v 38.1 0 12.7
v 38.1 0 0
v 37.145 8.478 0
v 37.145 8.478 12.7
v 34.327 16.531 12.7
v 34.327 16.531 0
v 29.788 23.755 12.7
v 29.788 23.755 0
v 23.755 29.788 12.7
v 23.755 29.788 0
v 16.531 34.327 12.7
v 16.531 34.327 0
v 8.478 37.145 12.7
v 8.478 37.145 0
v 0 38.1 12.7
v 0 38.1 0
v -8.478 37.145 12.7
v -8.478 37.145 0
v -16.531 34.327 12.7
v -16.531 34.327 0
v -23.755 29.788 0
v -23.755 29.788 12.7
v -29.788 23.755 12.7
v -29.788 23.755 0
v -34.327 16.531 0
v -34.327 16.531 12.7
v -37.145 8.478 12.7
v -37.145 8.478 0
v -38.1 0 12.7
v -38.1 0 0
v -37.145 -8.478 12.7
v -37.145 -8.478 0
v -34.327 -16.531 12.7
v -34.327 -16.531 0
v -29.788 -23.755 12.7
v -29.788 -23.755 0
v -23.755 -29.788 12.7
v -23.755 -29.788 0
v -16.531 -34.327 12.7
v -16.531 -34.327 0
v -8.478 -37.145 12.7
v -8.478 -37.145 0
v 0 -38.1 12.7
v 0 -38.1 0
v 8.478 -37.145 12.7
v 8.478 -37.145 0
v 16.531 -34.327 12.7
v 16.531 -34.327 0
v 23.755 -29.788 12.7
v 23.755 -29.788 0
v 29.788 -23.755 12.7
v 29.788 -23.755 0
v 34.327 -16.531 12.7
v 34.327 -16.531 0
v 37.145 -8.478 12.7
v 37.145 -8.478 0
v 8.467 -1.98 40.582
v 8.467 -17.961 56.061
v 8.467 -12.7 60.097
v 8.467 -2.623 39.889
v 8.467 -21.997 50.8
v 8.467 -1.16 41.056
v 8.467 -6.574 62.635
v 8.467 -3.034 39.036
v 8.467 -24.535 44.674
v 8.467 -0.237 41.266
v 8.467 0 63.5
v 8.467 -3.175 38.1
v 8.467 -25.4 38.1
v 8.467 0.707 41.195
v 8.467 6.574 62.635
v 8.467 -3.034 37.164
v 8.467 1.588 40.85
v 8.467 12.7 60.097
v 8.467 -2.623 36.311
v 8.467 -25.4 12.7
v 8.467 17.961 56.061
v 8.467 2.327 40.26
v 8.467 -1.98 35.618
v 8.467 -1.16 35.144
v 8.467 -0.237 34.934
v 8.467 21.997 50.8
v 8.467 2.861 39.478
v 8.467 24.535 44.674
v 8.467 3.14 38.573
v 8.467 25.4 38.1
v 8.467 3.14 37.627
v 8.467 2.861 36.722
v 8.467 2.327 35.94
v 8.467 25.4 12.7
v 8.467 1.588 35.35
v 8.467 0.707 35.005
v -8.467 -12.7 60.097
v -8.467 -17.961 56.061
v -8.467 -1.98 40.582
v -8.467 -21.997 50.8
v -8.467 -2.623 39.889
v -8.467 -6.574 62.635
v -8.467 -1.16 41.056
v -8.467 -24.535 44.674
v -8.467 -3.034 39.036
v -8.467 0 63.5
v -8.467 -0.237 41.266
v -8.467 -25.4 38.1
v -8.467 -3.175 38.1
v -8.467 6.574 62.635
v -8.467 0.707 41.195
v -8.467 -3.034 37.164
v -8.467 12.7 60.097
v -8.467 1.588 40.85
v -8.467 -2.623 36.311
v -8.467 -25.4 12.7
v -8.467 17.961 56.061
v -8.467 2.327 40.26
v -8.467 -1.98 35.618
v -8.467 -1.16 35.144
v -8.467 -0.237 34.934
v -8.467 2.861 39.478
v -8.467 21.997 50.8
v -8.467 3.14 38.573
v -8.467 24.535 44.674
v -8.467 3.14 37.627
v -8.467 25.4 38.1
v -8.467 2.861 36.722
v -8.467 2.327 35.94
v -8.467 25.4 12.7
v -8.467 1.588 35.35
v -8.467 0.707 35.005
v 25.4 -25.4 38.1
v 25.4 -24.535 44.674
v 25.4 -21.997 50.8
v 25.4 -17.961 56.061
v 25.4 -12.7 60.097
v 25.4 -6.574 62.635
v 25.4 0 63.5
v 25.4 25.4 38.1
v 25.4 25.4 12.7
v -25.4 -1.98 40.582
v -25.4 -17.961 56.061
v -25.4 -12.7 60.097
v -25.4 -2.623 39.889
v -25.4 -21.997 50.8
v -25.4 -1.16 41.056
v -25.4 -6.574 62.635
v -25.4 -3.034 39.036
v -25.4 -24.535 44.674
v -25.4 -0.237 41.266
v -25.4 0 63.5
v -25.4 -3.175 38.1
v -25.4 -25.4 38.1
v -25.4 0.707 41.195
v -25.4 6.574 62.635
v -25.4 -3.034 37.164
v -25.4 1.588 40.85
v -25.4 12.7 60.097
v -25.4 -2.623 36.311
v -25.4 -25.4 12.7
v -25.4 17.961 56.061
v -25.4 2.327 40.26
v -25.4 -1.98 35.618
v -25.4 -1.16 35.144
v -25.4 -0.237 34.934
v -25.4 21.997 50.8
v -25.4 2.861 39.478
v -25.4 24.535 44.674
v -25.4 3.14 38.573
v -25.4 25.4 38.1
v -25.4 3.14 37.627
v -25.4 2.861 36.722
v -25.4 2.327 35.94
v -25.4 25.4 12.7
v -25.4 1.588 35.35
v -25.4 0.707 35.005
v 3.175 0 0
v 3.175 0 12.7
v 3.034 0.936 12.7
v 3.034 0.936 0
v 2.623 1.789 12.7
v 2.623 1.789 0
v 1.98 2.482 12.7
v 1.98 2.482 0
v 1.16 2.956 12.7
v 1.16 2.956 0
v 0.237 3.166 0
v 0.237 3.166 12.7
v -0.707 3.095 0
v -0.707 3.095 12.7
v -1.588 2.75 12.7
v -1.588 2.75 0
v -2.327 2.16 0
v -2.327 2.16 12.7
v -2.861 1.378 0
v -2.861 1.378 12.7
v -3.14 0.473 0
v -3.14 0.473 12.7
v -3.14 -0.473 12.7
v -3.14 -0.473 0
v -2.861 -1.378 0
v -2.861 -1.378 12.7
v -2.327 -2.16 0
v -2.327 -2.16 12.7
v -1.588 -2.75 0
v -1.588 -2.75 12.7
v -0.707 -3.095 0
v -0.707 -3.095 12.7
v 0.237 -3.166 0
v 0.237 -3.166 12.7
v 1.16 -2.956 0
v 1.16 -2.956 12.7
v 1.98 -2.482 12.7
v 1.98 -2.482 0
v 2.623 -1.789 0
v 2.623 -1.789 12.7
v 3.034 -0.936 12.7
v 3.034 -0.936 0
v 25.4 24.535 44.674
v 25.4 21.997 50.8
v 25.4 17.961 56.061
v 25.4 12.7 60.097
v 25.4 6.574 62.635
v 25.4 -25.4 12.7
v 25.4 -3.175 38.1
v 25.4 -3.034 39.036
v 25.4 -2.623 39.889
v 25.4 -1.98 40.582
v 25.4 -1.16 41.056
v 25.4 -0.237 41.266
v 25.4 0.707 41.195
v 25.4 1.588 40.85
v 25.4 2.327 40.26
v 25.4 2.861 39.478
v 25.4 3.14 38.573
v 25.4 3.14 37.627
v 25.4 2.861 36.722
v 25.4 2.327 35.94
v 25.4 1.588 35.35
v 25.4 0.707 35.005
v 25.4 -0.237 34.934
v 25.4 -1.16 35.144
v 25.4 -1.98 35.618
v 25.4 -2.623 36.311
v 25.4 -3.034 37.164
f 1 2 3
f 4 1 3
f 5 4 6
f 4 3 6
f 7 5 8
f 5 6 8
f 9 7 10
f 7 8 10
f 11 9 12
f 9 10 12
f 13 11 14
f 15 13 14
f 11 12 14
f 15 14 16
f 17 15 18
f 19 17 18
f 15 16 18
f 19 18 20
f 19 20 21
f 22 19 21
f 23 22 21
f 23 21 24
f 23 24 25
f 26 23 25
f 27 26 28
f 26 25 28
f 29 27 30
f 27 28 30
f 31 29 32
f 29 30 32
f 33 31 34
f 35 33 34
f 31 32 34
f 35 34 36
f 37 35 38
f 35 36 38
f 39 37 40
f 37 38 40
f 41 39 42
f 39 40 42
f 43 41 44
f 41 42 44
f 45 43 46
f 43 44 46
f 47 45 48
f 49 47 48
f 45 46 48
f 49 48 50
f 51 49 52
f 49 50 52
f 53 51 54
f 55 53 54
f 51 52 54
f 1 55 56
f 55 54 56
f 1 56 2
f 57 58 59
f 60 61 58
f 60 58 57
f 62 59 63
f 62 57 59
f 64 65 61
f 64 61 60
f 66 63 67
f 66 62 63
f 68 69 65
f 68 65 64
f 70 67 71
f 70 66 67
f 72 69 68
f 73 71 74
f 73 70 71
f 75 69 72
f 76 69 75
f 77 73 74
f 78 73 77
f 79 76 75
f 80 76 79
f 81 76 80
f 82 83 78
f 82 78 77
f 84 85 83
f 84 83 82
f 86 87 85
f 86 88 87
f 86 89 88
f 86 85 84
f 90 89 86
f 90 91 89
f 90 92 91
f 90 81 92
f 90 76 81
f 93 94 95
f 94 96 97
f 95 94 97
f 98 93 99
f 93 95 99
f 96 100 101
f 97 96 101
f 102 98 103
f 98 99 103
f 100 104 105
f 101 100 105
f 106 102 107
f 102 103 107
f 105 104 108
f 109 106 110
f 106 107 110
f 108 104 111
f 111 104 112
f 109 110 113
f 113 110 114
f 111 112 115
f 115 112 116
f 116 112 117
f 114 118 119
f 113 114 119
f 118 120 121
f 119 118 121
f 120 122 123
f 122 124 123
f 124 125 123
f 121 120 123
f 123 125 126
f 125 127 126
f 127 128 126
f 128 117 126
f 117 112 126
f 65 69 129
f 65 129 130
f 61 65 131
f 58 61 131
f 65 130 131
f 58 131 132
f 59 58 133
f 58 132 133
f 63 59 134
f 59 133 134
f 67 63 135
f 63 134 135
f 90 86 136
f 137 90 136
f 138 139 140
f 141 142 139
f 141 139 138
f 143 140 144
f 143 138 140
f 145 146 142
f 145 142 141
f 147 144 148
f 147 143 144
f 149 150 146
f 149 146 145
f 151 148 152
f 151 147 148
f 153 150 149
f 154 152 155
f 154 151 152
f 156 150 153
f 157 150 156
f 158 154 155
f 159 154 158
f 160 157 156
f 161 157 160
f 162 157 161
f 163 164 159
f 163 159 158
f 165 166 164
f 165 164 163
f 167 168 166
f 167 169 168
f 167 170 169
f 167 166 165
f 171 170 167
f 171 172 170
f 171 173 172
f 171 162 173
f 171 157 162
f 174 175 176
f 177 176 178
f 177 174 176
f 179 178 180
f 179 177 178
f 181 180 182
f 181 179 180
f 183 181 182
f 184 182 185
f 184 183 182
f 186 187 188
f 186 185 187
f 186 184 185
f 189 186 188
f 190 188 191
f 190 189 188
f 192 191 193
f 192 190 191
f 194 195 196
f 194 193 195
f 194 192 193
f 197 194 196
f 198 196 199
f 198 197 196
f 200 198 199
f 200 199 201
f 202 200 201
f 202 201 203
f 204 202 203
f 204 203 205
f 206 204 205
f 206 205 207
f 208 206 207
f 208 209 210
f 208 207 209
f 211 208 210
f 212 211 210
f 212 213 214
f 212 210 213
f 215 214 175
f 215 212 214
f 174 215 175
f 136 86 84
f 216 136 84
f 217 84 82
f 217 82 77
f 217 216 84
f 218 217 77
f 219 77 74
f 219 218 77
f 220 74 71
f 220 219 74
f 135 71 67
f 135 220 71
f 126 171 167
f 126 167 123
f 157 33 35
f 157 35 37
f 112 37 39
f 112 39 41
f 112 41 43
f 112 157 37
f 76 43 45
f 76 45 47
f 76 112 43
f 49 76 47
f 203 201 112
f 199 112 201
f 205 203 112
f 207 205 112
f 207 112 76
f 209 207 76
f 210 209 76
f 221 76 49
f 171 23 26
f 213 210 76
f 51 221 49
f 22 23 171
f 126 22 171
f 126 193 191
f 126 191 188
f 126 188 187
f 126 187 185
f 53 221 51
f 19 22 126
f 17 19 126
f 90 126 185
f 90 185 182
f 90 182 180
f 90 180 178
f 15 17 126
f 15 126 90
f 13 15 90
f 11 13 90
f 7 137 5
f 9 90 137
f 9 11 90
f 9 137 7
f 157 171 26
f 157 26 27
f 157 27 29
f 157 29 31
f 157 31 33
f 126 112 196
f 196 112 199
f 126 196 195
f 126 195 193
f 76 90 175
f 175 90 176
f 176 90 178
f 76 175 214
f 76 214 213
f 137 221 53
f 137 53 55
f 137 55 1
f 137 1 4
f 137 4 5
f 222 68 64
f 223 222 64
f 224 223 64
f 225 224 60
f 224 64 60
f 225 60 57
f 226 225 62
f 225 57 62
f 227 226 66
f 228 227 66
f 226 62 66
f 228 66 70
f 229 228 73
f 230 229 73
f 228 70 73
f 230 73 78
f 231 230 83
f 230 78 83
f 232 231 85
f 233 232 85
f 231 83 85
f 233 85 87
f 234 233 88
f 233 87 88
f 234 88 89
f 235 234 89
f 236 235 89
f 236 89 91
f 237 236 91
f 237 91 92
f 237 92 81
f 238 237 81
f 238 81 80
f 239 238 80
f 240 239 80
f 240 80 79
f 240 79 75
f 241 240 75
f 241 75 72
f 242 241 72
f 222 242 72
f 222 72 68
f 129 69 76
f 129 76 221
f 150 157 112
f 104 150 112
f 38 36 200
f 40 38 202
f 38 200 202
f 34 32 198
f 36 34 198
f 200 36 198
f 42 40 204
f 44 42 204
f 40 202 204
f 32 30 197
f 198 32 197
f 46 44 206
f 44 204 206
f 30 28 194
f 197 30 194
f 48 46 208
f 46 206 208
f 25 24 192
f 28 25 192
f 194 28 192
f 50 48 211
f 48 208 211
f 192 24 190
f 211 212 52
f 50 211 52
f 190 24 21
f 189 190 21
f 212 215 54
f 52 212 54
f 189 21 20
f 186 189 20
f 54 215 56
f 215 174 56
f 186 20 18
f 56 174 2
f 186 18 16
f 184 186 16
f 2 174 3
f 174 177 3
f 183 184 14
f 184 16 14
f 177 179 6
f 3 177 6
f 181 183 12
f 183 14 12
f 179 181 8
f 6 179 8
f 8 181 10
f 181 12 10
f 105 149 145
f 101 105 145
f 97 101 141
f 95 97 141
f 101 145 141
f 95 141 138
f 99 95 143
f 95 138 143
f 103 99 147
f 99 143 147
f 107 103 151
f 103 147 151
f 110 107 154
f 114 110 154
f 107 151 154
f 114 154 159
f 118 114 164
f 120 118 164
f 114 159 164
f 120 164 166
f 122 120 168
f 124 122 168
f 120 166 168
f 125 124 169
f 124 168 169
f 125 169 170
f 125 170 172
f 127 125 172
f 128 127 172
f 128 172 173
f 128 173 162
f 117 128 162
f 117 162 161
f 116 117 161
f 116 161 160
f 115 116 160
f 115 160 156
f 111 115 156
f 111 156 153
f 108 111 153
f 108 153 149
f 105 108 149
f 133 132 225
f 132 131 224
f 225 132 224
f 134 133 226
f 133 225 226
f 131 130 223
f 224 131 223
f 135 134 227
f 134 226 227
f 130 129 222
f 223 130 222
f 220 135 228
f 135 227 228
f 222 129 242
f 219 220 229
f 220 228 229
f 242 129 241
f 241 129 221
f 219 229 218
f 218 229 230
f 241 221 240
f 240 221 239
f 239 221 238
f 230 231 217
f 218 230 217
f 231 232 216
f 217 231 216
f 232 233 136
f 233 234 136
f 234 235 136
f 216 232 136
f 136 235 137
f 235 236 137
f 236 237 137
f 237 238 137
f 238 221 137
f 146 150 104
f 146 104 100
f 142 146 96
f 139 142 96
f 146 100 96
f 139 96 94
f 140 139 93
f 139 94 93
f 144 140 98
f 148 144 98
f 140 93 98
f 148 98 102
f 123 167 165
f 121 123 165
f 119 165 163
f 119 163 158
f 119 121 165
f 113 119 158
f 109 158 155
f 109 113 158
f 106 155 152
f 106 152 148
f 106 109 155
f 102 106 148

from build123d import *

# Parameters (mm, degrees)
F0_R     = 3.175
F1_DEPTH = 25.4
F0_R_2   = 38.1
F2_DEPTH = 12.7
F3_W     = 16.933164
F3_H     = 50.8
F3_W_2   = 16.933333164
F4_DEPTH = 50.8
F5_R     = 25.39999
F6_R     = 3.175
F7_DEPTH = 103.2441
F8_DEPTH = 120.64677


# Not quite as in the source:
# - a fillet or chamfer is up to 0.001 mm smaller than in the source, because OpenCascade refuses the exact size


with BuildPart() as f1:
    # F0 (on Top) → F1 (new body)
    with BuildSketch(Plane.XY):
        Circle(F0_R)
    extrude(amount=-F1_DEPTH)

    # F0 (on Top) → F2 (join)
    with BuildSketch(Plane.XY):
        Circle(F0_R_2)
        Circle(F0_R, mode=Mode.SUBTRACT)
        Circle(F0_R)
    extrude(amount=F2_DEPTH)

    # F3 (on face) → F4 (join)
    with BuildSketch(Plane.XY.offset(12.7)):
        with Locations((16.933418, 0)):
            Rectangle(F3_W, F3_H)
        with Locations((-16.933333418, 0)):
            Rectangle(F3_W_2, F3_H)
    extrude(amount=F4_DEPTH)

    # F5 (radius 25.4 in the source; OpenCascade refuses exactly that, so slightly less here)
    f5_edges = [f1.edges().sort_by_distance(p)[0] for p in [
        (16.933418, -25.4, 63.5),
        (16.933418, 25.4, 63.5),
        (-16.933333, 25.4, 63.5),
        (-16.933333, -25.4, 63.5),
    ]]
    fillet(f5_edges, radius=F5_R)

    # F6 (on face) → F7 (cut)
    with BuildSketch(Plane(origin=(-25.4, 0, 0), x_dir=(0, -1, 0), z_dir=(-1, 0, 0))):
        with Locations((0, 38.1)):
            Circle(F6_R)
    extrude(amount=-F7_DEPTH, mode=Mode.SUBTRACT)

    # F8 (cut): a face of the model
    f8_faces = [f1.faces().sort_by_distance(p)[0] for p in [
        (0, 0, -25.4),
    ]]
    extrude(f8_faces, amount=-F8_DEPTH, mode=Mode.SUBTRACT)


solid = f1.part
